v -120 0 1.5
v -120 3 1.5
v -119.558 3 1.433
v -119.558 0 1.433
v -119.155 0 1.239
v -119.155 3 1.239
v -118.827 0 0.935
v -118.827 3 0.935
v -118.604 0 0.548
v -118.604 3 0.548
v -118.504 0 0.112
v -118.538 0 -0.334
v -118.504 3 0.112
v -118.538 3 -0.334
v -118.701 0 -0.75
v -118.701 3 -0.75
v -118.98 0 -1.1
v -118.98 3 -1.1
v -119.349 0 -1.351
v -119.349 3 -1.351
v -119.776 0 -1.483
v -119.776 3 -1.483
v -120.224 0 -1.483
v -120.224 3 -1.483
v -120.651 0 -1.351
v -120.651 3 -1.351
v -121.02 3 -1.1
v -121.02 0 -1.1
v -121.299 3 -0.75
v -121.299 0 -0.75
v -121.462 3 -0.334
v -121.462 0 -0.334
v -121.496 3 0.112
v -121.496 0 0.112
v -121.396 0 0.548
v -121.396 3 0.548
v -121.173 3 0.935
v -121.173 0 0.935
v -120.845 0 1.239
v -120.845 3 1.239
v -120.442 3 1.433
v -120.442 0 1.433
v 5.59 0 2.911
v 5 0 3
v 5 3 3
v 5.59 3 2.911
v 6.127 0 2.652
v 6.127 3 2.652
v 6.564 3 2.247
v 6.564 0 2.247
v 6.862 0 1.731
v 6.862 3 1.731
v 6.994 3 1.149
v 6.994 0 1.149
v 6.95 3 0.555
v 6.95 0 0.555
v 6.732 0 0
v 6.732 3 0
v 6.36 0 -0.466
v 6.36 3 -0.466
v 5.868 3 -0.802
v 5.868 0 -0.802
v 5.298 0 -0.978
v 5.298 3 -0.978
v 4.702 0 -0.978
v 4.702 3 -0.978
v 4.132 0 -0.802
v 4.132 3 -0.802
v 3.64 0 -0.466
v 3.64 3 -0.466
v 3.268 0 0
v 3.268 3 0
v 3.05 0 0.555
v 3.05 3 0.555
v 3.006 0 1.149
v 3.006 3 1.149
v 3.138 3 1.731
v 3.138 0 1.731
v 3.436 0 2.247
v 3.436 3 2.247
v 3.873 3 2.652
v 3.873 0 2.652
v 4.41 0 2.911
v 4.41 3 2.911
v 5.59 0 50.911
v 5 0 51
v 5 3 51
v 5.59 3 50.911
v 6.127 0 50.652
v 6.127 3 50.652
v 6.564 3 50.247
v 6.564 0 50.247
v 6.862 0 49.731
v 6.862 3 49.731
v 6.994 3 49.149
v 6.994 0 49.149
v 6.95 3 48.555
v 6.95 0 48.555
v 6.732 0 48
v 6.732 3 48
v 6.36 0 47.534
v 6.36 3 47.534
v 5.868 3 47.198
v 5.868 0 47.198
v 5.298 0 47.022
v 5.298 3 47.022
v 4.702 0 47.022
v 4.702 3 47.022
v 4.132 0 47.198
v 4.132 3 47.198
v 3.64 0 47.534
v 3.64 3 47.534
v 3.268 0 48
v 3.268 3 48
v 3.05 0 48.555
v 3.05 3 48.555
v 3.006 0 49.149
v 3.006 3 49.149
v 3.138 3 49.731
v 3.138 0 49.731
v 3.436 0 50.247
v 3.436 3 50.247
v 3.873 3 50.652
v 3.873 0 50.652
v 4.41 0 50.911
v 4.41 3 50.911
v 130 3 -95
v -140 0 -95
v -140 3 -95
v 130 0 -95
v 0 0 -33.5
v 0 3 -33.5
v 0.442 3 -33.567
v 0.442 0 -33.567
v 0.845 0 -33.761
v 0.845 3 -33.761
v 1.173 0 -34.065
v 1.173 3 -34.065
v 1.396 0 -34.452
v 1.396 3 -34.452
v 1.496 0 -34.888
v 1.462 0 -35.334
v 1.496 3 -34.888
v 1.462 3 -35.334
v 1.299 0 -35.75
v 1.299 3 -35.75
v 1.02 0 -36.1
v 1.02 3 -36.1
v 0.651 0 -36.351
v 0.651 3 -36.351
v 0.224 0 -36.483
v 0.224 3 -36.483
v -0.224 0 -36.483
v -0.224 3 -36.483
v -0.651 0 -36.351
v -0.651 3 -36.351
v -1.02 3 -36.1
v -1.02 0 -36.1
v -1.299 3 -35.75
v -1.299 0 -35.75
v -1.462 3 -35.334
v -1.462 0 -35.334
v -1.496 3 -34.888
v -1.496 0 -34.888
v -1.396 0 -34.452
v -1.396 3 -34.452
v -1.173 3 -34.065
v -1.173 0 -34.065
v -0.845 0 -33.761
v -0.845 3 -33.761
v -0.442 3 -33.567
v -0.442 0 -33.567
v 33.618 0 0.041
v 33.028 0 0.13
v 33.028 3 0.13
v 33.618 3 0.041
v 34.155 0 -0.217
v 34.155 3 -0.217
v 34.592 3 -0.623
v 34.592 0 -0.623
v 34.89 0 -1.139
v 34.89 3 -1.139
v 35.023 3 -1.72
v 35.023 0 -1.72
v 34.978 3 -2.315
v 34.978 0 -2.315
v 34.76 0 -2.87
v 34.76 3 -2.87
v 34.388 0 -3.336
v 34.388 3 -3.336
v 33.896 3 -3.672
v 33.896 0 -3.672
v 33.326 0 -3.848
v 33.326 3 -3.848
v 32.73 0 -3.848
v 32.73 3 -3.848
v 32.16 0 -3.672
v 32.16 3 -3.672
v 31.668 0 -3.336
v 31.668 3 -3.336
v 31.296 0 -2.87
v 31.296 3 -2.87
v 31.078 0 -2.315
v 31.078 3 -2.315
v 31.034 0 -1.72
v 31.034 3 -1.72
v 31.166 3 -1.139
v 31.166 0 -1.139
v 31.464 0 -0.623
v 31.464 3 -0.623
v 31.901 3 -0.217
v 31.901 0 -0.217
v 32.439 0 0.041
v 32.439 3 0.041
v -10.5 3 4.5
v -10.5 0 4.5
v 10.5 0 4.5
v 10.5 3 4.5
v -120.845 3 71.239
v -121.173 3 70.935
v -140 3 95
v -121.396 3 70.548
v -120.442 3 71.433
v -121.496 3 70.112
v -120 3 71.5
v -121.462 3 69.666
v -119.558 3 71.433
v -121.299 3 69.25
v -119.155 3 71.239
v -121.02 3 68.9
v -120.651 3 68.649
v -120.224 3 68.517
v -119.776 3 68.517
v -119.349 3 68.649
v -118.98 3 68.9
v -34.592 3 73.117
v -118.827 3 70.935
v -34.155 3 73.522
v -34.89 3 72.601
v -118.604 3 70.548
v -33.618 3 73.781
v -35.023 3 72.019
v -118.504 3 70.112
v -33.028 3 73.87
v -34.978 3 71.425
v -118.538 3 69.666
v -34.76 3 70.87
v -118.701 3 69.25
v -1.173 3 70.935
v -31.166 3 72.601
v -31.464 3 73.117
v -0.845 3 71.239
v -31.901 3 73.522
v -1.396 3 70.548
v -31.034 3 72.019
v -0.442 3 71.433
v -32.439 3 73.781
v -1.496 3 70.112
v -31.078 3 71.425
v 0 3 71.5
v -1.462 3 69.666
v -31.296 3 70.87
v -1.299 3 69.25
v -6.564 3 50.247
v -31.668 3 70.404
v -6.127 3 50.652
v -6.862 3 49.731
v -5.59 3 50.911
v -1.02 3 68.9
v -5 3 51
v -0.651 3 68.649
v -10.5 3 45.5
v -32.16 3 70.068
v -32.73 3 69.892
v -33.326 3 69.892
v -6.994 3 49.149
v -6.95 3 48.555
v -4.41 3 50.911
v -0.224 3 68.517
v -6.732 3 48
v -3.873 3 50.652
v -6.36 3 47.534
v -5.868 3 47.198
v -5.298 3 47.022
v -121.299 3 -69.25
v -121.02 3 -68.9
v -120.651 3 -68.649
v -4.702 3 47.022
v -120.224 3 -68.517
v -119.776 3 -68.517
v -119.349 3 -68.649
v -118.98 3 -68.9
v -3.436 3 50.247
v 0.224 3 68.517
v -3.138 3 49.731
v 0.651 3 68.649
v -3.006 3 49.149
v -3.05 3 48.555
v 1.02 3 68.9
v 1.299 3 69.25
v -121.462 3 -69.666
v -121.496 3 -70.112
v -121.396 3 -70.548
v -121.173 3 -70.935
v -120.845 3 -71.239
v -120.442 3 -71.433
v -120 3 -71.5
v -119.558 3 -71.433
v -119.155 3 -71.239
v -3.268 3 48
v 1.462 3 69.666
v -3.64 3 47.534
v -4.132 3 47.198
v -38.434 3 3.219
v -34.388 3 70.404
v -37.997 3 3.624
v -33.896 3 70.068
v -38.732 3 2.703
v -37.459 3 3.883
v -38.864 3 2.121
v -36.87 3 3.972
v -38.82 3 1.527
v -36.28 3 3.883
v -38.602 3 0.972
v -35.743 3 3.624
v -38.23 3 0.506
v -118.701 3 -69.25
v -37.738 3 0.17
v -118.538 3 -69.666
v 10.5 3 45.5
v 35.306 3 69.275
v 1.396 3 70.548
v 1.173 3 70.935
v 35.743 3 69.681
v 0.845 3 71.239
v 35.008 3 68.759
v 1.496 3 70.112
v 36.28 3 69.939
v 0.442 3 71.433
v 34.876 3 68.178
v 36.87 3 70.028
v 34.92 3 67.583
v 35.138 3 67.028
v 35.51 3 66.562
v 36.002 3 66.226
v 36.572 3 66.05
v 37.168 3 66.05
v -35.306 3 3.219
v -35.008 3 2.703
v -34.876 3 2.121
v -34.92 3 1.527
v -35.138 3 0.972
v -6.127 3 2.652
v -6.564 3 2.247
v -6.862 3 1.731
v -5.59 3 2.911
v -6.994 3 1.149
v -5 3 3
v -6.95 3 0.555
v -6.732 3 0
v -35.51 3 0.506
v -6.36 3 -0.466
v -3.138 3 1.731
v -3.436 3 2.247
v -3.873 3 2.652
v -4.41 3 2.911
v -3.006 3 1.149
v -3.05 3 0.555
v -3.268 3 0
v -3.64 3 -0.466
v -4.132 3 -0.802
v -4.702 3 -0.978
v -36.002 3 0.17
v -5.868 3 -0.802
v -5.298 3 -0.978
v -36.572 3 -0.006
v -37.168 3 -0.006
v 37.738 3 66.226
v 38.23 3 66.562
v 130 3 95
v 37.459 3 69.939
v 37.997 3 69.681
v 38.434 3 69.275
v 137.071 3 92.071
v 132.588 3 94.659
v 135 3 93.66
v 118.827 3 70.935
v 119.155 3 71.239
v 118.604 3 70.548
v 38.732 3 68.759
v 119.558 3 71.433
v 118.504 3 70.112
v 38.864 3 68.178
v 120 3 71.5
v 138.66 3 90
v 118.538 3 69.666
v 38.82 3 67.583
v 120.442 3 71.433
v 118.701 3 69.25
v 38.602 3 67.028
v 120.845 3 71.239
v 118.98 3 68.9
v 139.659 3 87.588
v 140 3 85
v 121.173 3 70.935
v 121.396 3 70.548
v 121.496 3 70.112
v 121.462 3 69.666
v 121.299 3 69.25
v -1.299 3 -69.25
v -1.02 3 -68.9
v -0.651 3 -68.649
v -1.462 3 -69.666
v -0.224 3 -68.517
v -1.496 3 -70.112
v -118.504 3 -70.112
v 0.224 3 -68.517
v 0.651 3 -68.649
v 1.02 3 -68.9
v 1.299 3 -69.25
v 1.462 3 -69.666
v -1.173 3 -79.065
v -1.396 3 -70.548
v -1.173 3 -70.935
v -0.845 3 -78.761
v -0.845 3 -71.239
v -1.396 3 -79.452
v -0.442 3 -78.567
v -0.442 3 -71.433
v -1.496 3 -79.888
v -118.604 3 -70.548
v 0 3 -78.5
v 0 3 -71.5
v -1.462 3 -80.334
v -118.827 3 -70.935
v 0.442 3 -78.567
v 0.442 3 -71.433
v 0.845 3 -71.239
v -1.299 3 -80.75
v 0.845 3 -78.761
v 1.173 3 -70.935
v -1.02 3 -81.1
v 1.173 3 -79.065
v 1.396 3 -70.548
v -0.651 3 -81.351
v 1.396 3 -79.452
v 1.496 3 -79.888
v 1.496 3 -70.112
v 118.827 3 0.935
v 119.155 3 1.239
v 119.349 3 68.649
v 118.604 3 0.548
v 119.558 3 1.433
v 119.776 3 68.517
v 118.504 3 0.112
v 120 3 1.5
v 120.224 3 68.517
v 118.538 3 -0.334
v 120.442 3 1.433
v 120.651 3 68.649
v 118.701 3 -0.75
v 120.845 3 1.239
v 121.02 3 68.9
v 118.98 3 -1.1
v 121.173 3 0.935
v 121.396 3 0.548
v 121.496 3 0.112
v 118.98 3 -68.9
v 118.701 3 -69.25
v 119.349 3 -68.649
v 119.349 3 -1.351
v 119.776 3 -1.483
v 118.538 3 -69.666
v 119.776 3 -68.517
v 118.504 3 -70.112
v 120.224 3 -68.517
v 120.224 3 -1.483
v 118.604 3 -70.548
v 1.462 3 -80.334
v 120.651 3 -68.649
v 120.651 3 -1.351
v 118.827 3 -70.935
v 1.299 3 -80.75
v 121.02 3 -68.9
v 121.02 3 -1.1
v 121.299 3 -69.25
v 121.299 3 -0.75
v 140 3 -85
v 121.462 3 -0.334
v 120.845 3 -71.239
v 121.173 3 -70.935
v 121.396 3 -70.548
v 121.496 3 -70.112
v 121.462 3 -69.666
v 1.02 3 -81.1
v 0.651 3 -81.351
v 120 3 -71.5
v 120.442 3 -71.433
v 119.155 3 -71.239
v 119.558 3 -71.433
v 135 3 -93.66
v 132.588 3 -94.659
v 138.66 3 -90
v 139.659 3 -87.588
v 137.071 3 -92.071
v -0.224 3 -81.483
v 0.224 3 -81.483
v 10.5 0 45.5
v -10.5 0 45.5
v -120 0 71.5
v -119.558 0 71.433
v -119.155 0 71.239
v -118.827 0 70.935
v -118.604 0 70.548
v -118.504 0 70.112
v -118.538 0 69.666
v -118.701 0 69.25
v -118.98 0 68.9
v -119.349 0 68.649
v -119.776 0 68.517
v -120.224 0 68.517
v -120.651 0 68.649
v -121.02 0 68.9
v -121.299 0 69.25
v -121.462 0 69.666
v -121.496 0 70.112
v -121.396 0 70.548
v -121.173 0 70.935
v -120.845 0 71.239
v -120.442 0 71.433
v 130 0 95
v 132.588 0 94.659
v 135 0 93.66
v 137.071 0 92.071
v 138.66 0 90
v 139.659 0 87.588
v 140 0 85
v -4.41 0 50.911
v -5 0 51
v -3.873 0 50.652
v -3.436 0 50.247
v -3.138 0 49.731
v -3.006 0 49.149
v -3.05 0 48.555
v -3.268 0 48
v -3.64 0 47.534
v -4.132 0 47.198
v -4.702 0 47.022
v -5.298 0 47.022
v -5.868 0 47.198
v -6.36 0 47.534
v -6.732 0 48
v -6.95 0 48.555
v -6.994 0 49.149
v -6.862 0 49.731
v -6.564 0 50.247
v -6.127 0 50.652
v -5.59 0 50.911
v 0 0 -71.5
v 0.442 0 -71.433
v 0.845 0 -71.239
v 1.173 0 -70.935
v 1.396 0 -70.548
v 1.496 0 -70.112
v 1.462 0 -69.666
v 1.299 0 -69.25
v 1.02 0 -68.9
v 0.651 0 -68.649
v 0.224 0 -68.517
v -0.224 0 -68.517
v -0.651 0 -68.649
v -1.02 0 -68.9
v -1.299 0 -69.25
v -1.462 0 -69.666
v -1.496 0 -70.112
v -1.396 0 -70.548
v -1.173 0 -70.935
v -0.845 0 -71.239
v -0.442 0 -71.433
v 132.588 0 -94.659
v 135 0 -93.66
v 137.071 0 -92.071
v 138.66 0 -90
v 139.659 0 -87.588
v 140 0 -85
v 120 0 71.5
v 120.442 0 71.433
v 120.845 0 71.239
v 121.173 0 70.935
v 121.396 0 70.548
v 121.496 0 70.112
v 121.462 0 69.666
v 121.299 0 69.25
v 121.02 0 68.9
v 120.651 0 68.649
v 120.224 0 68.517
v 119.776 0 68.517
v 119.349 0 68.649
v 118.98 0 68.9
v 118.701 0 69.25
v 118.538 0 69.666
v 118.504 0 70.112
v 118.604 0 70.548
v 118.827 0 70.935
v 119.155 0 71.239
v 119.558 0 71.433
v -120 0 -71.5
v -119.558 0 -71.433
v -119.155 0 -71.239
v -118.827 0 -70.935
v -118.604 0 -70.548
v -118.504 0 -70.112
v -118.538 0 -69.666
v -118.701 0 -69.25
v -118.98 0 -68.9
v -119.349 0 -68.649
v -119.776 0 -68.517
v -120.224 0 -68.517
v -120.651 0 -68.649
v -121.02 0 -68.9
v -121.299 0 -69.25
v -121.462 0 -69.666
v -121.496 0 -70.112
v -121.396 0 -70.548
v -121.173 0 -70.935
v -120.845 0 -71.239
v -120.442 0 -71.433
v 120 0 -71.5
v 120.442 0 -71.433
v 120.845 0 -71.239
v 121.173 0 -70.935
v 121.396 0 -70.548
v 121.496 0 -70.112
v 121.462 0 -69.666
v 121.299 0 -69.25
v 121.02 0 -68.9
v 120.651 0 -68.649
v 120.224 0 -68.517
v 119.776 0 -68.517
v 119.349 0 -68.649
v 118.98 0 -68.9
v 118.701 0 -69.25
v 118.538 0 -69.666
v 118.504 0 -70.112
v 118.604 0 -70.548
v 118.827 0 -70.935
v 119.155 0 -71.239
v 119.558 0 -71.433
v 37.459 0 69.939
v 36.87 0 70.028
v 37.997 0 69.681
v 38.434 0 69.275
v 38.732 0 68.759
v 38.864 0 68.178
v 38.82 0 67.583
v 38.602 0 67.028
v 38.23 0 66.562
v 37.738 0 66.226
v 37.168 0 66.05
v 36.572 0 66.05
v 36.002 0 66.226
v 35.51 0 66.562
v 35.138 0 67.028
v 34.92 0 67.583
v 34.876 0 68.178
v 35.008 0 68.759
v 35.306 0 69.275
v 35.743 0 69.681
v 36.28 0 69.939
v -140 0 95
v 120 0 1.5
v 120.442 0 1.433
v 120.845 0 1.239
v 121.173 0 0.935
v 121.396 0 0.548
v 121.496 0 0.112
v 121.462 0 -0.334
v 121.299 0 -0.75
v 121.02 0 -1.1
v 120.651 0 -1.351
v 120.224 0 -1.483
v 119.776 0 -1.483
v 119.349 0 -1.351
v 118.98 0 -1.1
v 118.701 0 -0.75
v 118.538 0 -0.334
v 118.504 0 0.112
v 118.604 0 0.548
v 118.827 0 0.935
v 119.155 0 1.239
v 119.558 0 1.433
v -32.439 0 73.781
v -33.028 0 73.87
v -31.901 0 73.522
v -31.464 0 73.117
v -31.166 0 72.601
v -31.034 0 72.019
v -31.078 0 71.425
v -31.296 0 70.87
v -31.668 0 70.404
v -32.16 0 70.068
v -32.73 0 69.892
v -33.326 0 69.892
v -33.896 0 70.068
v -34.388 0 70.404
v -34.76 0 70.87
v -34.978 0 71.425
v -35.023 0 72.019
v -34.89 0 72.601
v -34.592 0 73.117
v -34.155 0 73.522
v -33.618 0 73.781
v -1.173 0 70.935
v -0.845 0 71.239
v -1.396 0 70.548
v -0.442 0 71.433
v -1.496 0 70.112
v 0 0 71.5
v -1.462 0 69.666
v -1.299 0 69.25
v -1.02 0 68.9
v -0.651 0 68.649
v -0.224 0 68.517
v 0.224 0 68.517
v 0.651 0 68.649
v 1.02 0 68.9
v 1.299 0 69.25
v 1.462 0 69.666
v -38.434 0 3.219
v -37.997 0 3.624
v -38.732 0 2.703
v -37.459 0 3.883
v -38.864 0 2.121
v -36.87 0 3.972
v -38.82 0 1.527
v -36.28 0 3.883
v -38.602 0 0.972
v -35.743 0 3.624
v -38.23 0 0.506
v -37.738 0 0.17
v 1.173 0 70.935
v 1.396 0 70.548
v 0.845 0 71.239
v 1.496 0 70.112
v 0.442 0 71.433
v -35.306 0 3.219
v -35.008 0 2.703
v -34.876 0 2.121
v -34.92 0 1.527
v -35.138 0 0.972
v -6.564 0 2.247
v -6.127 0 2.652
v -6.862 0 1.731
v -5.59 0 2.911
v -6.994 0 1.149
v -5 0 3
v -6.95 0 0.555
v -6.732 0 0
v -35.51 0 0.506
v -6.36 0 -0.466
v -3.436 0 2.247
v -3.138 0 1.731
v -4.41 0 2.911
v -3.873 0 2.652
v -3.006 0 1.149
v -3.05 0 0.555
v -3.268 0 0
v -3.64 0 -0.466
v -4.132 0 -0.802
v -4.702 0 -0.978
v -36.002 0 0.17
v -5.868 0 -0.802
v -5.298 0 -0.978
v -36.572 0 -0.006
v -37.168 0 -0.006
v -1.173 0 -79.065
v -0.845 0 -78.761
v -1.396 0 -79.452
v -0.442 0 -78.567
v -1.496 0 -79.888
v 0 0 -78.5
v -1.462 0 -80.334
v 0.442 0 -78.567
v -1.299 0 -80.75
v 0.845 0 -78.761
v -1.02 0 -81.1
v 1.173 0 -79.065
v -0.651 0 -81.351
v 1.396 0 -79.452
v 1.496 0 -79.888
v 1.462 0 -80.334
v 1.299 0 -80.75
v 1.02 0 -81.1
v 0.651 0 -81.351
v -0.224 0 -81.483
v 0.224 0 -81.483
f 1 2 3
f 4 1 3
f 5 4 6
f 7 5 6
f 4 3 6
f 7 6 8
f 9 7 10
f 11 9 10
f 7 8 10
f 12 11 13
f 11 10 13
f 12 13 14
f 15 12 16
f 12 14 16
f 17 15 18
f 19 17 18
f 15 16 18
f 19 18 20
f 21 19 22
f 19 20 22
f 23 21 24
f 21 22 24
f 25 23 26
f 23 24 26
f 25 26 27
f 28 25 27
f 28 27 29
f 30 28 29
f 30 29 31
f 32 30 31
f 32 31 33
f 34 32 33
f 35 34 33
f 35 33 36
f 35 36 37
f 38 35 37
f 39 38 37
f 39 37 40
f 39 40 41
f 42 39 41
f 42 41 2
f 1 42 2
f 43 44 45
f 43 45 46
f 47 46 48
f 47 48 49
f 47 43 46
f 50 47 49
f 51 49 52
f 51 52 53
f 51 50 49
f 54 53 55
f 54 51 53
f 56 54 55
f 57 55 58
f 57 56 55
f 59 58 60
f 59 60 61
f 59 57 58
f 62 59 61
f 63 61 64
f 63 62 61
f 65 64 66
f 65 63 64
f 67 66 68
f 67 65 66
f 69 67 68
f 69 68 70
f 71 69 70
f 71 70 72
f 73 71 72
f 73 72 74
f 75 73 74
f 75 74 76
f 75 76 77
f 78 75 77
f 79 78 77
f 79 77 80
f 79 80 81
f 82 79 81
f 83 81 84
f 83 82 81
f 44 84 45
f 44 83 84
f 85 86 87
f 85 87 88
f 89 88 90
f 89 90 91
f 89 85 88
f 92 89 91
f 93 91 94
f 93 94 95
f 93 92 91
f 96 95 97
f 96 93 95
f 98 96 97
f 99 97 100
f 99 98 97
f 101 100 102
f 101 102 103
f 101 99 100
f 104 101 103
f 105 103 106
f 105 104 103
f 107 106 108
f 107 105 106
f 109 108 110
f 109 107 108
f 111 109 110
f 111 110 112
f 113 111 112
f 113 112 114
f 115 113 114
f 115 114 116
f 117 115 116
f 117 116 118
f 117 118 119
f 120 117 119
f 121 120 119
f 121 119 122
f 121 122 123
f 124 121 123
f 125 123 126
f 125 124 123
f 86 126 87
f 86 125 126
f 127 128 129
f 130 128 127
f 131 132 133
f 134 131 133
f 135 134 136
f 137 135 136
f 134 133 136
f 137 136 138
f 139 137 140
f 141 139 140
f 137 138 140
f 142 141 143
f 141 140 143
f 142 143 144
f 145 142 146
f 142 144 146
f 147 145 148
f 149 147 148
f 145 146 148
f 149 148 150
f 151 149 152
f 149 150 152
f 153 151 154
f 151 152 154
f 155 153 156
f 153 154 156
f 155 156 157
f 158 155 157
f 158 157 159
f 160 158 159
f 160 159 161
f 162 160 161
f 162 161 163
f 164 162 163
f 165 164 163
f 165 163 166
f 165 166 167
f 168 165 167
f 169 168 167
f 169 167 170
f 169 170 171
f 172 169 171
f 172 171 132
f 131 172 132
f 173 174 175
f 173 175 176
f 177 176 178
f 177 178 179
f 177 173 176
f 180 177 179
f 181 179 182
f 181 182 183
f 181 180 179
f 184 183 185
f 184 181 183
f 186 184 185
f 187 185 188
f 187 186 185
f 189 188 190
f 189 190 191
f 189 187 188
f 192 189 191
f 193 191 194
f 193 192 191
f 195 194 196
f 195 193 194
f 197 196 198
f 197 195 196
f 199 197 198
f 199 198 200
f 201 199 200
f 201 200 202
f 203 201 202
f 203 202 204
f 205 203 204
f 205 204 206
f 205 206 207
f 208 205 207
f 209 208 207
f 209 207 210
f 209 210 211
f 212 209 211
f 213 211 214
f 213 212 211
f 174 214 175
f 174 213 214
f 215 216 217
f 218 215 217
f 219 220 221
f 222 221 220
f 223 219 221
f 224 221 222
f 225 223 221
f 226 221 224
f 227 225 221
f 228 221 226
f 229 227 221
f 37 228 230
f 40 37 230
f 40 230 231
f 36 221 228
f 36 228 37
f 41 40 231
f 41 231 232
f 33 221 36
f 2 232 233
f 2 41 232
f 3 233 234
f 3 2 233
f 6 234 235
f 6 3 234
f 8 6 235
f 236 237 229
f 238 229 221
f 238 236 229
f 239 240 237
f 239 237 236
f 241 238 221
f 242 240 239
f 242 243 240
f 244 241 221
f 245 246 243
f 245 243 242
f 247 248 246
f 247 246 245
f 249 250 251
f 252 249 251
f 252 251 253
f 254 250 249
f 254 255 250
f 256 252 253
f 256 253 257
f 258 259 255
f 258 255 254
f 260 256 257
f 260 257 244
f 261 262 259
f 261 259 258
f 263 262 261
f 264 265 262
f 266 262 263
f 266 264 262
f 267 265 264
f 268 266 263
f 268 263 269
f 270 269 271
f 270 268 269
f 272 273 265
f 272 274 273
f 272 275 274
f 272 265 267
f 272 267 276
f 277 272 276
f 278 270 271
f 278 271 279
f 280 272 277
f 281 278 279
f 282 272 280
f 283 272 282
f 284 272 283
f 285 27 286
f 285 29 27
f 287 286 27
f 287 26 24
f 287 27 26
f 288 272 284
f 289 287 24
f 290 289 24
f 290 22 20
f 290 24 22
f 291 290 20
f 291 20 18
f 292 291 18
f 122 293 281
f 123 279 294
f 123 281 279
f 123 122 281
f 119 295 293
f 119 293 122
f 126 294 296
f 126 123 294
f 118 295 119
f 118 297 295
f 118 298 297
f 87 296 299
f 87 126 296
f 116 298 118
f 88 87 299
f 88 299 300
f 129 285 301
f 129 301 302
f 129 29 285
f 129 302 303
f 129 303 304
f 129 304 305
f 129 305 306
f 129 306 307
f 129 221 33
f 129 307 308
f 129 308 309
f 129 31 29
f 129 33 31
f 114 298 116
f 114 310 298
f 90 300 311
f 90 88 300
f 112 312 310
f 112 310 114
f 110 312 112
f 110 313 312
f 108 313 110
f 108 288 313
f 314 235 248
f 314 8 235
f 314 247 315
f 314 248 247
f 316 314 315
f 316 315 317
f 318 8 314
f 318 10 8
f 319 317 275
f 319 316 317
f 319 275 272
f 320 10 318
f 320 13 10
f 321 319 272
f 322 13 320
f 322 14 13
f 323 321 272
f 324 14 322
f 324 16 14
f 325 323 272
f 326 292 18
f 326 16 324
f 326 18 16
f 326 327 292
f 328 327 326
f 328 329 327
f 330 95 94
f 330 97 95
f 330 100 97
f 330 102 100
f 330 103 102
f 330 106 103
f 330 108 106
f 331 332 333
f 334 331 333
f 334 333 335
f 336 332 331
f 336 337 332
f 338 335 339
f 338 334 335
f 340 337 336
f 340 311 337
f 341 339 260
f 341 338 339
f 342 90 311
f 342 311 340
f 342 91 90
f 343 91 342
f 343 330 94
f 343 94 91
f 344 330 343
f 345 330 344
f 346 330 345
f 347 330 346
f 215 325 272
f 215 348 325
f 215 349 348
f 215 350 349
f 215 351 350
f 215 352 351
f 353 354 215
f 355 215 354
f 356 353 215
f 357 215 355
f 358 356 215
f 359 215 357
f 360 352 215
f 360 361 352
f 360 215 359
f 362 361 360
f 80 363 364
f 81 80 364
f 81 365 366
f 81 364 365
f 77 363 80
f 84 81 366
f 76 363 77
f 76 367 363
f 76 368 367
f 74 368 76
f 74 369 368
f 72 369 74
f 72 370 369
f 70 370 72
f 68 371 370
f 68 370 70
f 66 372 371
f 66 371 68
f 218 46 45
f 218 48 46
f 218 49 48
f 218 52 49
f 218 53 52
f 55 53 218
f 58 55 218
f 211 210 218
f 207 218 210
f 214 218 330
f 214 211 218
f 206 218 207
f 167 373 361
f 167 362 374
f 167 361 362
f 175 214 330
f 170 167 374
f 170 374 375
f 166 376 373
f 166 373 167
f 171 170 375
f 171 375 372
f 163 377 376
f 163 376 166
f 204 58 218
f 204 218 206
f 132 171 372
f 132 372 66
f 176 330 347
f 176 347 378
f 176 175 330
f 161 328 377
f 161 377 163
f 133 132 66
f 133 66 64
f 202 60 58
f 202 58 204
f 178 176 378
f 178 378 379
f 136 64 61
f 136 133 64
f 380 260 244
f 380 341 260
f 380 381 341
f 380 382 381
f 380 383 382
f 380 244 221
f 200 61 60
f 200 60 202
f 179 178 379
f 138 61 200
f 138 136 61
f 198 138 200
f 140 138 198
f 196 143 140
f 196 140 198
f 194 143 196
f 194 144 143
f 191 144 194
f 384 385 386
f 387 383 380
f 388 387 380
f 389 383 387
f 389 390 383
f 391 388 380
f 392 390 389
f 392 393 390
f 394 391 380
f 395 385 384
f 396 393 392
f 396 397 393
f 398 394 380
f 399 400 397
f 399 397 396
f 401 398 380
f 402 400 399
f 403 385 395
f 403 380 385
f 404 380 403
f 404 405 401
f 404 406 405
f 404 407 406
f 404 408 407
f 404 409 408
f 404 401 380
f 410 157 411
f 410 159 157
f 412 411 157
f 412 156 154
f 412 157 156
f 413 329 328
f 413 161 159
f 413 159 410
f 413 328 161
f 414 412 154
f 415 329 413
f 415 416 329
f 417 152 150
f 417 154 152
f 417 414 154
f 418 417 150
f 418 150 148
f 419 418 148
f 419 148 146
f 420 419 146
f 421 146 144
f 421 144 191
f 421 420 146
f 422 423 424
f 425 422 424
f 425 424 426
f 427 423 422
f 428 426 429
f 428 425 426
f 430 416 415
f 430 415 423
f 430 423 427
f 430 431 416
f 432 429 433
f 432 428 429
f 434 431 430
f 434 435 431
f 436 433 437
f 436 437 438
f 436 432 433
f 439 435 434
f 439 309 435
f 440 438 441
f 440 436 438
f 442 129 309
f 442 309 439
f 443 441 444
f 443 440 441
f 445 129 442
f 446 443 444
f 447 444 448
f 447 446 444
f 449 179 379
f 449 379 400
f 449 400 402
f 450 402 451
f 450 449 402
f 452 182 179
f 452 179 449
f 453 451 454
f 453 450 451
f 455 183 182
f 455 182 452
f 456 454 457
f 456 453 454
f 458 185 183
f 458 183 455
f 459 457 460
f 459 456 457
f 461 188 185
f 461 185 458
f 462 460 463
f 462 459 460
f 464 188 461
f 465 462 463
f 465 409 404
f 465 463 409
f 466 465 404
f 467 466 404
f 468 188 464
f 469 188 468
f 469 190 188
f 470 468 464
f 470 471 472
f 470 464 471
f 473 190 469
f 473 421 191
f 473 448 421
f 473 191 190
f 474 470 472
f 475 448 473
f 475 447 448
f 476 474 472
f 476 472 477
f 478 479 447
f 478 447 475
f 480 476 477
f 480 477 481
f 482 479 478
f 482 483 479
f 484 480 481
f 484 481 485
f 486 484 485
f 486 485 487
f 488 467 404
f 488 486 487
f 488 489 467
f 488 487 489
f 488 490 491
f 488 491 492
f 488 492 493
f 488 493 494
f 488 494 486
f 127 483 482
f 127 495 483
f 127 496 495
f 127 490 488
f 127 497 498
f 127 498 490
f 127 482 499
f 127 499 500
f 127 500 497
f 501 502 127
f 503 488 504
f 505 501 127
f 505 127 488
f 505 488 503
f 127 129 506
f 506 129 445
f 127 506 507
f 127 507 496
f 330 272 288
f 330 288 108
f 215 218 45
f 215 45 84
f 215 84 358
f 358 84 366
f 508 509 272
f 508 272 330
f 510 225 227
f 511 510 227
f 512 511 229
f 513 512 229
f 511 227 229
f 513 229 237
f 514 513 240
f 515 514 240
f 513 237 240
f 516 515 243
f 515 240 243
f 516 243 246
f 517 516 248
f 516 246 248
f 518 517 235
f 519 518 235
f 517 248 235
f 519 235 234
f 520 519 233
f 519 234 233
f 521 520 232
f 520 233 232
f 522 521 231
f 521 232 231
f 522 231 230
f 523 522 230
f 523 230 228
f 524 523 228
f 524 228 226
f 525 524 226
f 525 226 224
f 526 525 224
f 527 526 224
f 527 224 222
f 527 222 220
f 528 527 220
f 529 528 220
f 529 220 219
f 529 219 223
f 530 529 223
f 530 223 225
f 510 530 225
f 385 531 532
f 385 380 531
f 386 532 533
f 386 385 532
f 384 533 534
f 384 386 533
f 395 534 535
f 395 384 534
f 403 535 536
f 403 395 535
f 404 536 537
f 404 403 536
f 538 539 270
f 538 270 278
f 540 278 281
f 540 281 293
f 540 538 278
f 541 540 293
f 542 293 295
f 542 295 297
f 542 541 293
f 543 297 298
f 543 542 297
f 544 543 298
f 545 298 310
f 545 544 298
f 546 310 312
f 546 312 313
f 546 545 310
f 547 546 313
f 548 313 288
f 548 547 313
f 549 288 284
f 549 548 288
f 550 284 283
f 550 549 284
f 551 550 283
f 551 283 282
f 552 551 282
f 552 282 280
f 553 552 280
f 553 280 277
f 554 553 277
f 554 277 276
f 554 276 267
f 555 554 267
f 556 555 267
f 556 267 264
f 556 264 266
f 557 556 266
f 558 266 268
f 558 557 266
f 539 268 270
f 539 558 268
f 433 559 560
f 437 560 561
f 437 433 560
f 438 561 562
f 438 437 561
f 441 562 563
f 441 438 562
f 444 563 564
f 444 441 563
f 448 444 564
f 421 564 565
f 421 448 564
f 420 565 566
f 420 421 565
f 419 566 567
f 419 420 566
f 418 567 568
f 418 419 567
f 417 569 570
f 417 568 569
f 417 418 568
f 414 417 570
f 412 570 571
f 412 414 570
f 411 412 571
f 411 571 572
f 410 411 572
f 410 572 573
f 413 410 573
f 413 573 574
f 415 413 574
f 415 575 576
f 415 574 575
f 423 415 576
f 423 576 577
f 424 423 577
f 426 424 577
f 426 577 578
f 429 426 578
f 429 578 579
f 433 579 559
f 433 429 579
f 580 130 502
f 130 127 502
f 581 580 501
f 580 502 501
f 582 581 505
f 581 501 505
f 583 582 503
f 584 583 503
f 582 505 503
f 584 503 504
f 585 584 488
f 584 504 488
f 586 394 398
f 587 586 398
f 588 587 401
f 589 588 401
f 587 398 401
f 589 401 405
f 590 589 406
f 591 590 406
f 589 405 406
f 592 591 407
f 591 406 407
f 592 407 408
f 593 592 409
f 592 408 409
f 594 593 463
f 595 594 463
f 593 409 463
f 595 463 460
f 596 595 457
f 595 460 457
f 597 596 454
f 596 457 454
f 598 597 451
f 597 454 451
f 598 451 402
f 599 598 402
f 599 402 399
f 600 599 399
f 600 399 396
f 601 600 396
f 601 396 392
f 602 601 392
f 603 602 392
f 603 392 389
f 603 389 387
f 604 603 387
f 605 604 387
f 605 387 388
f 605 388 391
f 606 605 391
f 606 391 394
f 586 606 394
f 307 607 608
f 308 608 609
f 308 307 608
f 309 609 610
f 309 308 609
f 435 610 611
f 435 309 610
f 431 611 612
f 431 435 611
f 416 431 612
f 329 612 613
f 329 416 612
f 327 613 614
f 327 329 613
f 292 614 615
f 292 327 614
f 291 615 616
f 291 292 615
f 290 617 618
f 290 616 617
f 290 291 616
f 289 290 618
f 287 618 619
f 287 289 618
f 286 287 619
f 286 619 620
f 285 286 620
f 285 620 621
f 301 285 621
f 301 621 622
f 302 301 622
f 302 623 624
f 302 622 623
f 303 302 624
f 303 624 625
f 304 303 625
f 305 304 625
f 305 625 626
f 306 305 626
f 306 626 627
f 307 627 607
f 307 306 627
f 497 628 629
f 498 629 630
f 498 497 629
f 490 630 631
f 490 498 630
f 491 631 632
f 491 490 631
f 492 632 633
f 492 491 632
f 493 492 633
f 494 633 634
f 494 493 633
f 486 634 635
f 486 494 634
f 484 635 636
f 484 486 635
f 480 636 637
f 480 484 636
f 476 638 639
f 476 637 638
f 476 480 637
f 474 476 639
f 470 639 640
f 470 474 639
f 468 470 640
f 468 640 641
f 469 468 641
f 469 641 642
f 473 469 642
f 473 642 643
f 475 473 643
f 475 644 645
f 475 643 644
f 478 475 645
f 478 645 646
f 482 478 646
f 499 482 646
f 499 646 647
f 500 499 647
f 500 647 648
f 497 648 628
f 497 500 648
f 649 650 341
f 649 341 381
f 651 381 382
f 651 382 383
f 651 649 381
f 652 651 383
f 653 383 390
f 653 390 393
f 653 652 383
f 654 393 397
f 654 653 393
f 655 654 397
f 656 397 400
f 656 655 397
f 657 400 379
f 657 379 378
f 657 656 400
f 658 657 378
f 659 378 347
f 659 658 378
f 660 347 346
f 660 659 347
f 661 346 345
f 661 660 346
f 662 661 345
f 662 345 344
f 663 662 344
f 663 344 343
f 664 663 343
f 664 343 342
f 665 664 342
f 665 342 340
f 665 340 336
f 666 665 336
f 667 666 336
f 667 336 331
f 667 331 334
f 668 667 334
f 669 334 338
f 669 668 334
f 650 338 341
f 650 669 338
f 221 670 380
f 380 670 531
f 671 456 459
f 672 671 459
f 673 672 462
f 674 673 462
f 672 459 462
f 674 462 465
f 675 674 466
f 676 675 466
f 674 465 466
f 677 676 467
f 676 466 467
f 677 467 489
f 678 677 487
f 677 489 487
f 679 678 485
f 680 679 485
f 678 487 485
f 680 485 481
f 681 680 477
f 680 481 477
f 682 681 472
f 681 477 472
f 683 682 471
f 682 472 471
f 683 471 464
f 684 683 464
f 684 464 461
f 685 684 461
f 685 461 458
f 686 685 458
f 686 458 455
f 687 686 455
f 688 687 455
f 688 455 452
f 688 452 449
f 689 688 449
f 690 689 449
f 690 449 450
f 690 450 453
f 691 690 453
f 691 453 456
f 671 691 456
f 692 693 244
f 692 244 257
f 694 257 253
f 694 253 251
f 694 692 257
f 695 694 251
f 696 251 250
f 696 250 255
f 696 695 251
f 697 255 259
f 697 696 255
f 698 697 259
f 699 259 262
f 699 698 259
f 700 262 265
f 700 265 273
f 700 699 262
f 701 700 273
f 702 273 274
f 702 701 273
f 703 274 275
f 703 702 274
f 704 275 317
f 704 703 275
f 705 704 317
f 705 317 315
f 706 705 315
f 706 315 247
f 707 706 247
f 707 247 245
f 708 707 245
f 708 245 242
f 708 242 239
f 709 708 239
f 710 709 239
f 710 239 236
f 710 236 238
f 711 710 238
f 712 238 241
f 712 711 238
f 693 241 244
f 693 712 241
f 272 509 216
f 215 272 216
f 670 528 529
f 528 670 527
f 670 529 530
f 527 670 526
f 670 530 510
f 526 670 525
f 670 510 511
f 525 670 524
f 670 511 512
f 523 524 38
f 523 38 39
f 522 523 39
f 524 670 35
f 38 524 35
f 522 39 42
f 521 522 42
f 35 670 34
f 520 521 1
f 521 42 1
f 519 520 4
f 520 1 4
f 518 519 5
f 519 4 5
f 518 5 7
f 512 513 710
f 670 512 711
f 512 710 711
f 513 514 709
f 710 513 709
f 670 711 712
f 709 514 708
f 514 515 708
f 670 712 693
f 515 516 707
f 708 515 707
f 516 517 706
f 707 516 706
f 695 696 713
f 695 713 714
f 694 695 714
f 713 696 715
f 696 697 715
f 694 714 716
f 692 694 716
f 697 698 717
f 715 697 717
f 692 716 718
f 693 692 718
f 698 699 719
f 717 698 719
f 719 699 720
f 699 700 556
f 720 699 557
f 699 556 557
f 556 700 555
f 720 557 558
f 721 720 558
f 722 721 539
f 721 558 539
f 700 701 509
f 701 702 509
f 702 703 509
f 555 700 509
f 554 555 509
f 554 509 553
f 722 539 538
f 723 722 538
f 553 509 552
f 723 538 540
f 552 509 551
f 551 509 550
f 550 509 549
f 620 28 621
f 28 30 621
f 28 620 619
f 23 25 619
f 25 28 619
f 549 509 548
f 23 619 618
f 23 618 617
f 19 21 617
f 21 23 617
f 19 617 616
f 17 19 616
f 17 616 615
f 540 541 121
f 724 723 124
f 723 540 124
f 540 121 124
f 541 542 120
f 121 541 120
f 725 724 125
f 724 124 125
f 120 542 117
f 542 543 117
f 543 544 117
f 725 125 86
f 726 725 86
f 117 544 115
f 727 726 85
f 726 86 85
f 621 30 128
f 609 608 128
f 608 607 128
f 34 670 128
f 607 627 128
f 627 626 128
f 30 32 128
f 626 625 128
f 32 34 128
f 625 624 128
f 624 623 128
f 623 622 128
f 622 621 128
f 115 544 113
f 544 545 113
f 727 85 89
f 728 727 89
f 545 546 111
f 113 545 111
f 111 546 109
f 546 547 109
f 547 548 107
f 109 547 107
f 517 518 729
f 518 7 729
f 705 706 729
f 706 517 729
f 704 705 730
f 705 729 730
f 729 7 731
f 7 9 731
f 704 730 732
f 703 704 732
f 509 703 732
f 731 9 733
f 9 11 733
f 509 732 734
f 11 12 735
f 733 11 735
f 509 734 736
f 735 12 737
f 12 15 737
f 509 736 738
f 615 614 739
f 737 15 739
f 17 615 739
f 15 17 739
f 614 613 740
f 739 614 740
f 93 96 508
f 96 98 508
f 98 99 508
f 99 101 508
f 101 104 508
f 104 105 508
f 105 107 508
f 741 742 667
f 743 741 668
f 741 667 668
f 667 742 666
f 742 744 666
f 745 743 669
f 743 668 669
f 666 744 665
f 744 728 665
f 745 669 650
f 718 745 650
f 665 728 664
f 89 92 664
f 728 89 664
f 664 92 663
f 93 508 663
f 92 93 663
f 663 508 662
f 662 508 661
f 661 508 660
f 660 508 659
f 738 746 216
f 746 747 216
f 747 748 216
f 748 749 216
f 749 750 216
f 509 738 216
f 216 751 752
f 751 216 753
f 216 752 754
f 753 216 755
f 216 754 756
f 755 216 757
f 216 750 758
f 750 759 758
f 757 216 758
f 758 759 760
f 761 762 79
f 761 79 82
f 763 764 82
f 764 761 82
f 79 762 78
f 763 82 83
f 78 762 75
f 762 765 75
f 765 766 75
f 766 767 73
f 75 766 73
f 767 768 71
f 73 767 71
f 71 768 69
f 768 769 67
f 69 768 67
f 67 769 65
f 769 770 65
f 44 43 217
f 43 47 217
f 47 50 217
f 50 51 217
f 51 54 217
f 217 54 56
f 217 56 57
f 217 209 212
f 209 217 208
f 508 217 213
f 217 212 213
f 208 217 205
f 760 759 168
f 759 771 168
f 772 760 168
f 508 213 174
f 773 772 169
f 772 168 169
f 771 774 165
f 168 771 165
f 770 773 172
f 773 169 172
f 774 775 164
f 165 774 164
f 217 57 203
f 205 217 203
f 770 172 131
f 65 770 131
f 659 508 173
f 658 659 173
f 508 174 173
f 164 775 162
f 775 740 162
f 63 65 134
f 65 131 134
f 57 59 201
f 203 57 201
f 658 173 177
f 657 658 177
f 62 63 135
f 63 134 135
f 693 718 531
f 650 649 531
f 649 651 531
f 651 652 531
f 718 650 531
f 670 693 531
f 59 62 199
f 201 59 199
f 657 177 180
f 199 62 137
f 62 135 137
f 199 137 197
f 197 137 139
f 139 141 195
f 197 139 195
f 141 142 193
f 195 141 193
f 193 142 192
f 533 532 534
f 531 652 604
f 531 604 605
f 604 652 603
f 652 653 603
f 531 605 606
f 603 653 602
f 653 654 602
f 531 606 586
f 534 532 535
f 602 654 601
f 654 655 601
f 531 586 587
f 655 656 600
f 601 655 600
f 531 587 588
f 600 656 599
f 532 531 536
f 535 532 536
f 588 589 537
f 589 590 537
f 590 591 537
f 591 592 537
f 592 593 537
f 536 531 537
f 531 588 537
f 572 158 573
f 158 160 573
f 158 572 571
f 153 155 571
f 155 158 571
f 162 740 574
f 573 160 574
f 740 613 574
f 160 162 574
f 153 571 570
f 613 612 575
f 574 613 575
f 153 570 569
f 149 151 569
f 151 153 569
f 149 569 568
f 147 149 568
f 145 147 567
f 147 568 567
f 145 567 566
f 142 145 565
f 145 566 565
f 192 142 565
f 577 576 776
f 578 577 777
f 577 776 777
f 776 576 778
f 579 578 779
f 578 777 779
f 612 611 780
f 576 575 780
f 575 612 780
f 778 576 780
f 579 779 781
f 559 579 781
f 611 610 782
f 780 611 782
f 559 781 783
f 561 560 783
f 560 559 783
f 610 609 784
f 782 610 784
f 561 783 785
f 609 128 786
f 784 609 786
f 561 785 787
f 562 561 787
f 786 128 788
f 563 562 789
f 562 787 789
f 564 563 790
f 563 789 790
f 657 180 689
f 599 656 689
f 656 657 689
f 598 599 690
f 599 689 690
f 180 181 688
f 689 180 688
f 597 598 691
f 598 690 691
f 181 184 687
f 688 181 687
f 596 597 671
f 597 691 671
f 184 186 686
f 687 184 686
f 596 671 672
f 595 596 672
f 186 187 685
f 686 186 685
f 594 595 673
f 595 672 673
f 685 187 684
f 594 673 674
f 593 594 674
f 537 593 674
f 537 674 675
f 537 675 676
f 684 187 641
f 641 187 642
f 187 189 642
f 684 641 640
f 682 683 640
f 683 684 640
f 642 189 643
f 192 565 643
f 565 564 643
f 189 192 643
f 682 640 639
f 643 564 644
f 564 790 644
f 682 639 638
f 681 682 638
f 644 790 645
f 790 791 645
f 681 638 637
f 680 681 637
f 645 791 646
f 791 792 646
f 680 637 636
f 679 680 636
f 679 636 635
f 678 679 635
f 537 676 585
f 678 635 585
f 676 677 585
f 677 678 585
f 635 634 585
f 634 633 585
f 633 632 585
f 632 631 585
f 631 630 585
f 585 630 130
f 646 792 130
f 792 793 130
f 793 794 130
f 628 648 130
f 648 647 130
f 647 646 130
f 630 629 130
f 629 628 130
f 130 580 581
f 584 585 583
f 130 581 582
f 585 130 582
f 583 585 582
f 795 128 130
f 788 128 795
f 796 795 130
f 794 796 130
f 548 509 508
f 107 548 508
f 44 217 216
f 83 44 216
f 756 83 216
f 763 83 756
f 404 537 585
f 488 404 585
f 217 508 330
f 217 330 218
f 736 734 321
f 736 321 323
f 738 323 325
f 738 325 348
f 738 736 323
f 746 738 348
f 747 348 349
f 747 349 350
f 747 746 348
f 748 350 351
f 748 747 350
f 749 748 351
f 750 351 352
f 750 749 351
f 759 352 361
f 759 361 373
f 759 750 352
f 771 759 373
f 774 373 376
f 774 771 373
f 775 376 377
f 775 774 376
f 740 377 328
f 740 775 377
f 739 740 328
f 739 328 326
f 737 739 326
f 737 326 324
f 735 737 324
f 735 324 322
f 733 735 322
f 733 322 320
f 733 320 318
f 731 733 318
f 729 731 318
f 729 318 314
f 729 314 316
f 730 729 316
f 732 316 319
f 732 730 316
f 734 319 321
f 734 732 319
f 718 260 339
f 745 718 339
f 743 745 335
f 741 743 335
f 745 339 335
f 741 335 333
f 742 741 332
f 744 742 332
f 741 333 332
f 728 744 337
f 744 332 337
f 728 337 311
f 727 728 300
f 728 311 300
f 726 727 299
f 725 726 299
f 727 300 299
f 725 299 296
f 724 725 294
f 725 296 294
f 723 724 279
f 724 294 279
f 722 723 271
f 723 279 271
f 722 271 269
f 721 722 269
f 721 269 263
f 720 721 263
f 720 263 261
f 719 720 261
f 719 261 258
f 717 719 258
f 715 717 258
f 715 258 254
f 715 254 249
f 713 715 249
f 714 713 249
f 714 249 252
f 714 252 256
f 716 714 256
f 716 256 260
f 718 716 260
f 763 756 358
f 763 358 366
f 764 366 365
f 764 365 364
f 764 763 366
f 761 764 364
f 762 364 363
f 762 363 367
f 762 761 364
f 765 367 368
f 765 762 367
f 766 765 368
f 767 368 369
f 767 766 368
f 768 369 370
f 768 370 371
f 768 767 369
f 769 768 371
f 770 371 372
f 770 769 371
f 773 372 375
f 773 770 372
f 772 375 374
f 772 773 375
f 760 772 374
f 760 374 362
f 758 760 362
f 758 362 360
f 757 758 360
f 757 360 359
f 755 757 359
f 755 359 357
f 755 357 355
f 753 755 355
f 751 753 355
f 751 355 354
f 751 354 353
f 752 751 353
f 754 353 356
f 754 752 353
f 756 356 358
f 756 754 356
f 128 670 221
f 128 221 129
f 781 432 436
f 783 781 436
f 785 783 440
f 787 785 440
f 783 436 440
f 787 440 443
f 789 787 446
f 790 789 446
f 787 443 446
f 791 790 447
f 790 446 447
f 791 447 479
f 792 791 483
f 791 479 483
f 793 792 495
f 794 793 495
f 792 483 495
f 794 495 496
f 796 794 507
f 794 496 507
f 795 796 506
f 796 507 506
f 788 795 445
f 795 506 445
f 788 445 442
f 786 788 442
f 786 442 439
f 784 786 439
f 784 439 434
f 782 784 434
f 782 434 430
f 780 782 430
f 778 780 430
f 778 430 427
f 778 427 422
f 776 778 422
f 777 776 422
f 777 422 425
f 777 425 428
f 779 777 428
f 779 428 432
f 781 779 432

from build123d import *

# Parameters (mm, degrees)
SKETCH_1_W          = 280
SKETCH_1_H          = 190
SKETCH_1_R          = 2
SKETCH_1_W_2        = 21
SKETCH_1_H_2        = 41
EXTRUDE_1_DEPTH     = 3
FILLET_1_R          = 10
SKETCH_2_R          = 1.5
CUT_EXTRUDE_1_DEPTH = 10
SKETCH_3_R          = 1.5
CUT_EXTRUDE_2_DEPTH = 10
SKETCH_4_R          = 1.5
CUT_EXTRUDE_3_DEPTH = 10


with BuildPart() as part:
    # 草图1 → 凸台-拉伸1 (new body)
    with BuildSketch(Plane(origin=(0, 0, 0), x_dir=(1, 0, 0), z_dir=(0, 1, 0))):
        Rectangle(SKETCH_1_W, SKETCH_1_H)
        with Locations(Location((5, -1, 0), (0, 0, 270))):
            Circle(SKETCH_1_R, mode=Mode.SUBTRACT)
        with Locations(Location((-5, -1, 0), (0, 0, 270))):
            Circle(SKETCH_1_R, mode=Mode.SUBTRACT)
        with Locations(Location((-5, -49, 0), (0, 0, 270))):
            Circle(SKETCH_1_R, mode=Mode.SUBTRACT)
        with Locations(Location((-33.028134356, -71.869938174, 0), (0, 0, 270))):
            Circle(SKETCH_1_R, mode=Mode.SUBTRACT)
        with Locations(Location((5, -49, 0), (0, 0, 270))):
            Circle(SKETCH_1_R, mode=Mode.SUBTRACT)
        with Locations(Location((-36.869938174, -1.971865644, 0), (0, 0, 270))):
            Circle(SKETCH_1_R, mode=Mode.SUBTRACT)
        with Locations(Location((33.028134356, 1.869938174, 0), (0, 0, 270))):
            Circle(SKETCH_1_R, mode=Mode.SUBTRACT)
        with Locations(Location((36.869938174, -68.028134356, 0), (0, 0, 270))):
            Circle(SKETCH_1_R, mode=Mode.SUBTRACT)
        with Locations((0, -25)):
            Rectangle(SKETCH_1_W_2, SKETCH_1_H_2, mode=Mode.SUBTRACT)
    extrude(amount=EXTRUDE_1_DEPTH)

    # 圆角1
    fillet_1_edges = [part.edges().sort_by_distance(p)[0] for p in [
        (140, 1.5, 95),
        (140, 1.5, -95),
    ]]
    fillet(fillet_1_edges, radius=FILLET_1_R)

    # 草图2 → 切除-拉伸1 (cut)
    with BuildSketch(Plane(origin=(0, 3, 0), x_dir=(1, 0, 0), z_dir=(0, 1, 0))):
        with Locations(Location((120, -70, 0), (0, 0, 270))):
            Circle(SKETCH_2_R)
        with Locations(Location((0, -70, 0), (0, 0, 270))):
            Circle(SKETCH_2_R)
        with Locations(Location((-120, -70, 0), (0, 0, 270))):
            Circle(SKETCH_2_R)
    cut_extrude_1 = extrude(amount=-CUT_EXTRUDE_1_DEPTH, mode=Mode.SUBTRACT)

    # 镜向1: 切除-拉伸1 across plane
    add(cut_extrude_1.mirror(Plane.XY), mode=Mode.SUBTRACT)

    # 草图3 → 切除-拉伸2 (cut)
    with BuildSketch(Plane(origin=(0, 3, 0), x_dir=(1, 0, 0), z_dir=(0, 1, 0))):
        with Locations(Location((120, 0, 0), (0, 0, 270))):
            Circle(SKETCH_3_R)
        with Locations(Location((-120, 0, 0), (0, 0, 270))):
            Circle(SKETCH_3_R)
    extrude(amount=-CUT_EXTRUDE_2_DEPTH, mode=Mode.SUBTRACT)

    # 草图4 → 切除-拉伸3 (cut)
    with BuildSketch(Plane(origin=(0, 3, 0), x_dir=(1, 0, 0), z_dir=(0, 1, 0))):
        with Locations(Location((0, 80, 0), (0, 0, 270))):
            Circle(SKETCH_4_R)
        with Locations(Location((0, 35, 0), (0, 0, 270))):
            Circle(SKETCH_4_R)
    extrude(amount=-CUT_EXTRUDE_3_DEPTH, mode=Mode.SUBTRACT)


solid = part.part
